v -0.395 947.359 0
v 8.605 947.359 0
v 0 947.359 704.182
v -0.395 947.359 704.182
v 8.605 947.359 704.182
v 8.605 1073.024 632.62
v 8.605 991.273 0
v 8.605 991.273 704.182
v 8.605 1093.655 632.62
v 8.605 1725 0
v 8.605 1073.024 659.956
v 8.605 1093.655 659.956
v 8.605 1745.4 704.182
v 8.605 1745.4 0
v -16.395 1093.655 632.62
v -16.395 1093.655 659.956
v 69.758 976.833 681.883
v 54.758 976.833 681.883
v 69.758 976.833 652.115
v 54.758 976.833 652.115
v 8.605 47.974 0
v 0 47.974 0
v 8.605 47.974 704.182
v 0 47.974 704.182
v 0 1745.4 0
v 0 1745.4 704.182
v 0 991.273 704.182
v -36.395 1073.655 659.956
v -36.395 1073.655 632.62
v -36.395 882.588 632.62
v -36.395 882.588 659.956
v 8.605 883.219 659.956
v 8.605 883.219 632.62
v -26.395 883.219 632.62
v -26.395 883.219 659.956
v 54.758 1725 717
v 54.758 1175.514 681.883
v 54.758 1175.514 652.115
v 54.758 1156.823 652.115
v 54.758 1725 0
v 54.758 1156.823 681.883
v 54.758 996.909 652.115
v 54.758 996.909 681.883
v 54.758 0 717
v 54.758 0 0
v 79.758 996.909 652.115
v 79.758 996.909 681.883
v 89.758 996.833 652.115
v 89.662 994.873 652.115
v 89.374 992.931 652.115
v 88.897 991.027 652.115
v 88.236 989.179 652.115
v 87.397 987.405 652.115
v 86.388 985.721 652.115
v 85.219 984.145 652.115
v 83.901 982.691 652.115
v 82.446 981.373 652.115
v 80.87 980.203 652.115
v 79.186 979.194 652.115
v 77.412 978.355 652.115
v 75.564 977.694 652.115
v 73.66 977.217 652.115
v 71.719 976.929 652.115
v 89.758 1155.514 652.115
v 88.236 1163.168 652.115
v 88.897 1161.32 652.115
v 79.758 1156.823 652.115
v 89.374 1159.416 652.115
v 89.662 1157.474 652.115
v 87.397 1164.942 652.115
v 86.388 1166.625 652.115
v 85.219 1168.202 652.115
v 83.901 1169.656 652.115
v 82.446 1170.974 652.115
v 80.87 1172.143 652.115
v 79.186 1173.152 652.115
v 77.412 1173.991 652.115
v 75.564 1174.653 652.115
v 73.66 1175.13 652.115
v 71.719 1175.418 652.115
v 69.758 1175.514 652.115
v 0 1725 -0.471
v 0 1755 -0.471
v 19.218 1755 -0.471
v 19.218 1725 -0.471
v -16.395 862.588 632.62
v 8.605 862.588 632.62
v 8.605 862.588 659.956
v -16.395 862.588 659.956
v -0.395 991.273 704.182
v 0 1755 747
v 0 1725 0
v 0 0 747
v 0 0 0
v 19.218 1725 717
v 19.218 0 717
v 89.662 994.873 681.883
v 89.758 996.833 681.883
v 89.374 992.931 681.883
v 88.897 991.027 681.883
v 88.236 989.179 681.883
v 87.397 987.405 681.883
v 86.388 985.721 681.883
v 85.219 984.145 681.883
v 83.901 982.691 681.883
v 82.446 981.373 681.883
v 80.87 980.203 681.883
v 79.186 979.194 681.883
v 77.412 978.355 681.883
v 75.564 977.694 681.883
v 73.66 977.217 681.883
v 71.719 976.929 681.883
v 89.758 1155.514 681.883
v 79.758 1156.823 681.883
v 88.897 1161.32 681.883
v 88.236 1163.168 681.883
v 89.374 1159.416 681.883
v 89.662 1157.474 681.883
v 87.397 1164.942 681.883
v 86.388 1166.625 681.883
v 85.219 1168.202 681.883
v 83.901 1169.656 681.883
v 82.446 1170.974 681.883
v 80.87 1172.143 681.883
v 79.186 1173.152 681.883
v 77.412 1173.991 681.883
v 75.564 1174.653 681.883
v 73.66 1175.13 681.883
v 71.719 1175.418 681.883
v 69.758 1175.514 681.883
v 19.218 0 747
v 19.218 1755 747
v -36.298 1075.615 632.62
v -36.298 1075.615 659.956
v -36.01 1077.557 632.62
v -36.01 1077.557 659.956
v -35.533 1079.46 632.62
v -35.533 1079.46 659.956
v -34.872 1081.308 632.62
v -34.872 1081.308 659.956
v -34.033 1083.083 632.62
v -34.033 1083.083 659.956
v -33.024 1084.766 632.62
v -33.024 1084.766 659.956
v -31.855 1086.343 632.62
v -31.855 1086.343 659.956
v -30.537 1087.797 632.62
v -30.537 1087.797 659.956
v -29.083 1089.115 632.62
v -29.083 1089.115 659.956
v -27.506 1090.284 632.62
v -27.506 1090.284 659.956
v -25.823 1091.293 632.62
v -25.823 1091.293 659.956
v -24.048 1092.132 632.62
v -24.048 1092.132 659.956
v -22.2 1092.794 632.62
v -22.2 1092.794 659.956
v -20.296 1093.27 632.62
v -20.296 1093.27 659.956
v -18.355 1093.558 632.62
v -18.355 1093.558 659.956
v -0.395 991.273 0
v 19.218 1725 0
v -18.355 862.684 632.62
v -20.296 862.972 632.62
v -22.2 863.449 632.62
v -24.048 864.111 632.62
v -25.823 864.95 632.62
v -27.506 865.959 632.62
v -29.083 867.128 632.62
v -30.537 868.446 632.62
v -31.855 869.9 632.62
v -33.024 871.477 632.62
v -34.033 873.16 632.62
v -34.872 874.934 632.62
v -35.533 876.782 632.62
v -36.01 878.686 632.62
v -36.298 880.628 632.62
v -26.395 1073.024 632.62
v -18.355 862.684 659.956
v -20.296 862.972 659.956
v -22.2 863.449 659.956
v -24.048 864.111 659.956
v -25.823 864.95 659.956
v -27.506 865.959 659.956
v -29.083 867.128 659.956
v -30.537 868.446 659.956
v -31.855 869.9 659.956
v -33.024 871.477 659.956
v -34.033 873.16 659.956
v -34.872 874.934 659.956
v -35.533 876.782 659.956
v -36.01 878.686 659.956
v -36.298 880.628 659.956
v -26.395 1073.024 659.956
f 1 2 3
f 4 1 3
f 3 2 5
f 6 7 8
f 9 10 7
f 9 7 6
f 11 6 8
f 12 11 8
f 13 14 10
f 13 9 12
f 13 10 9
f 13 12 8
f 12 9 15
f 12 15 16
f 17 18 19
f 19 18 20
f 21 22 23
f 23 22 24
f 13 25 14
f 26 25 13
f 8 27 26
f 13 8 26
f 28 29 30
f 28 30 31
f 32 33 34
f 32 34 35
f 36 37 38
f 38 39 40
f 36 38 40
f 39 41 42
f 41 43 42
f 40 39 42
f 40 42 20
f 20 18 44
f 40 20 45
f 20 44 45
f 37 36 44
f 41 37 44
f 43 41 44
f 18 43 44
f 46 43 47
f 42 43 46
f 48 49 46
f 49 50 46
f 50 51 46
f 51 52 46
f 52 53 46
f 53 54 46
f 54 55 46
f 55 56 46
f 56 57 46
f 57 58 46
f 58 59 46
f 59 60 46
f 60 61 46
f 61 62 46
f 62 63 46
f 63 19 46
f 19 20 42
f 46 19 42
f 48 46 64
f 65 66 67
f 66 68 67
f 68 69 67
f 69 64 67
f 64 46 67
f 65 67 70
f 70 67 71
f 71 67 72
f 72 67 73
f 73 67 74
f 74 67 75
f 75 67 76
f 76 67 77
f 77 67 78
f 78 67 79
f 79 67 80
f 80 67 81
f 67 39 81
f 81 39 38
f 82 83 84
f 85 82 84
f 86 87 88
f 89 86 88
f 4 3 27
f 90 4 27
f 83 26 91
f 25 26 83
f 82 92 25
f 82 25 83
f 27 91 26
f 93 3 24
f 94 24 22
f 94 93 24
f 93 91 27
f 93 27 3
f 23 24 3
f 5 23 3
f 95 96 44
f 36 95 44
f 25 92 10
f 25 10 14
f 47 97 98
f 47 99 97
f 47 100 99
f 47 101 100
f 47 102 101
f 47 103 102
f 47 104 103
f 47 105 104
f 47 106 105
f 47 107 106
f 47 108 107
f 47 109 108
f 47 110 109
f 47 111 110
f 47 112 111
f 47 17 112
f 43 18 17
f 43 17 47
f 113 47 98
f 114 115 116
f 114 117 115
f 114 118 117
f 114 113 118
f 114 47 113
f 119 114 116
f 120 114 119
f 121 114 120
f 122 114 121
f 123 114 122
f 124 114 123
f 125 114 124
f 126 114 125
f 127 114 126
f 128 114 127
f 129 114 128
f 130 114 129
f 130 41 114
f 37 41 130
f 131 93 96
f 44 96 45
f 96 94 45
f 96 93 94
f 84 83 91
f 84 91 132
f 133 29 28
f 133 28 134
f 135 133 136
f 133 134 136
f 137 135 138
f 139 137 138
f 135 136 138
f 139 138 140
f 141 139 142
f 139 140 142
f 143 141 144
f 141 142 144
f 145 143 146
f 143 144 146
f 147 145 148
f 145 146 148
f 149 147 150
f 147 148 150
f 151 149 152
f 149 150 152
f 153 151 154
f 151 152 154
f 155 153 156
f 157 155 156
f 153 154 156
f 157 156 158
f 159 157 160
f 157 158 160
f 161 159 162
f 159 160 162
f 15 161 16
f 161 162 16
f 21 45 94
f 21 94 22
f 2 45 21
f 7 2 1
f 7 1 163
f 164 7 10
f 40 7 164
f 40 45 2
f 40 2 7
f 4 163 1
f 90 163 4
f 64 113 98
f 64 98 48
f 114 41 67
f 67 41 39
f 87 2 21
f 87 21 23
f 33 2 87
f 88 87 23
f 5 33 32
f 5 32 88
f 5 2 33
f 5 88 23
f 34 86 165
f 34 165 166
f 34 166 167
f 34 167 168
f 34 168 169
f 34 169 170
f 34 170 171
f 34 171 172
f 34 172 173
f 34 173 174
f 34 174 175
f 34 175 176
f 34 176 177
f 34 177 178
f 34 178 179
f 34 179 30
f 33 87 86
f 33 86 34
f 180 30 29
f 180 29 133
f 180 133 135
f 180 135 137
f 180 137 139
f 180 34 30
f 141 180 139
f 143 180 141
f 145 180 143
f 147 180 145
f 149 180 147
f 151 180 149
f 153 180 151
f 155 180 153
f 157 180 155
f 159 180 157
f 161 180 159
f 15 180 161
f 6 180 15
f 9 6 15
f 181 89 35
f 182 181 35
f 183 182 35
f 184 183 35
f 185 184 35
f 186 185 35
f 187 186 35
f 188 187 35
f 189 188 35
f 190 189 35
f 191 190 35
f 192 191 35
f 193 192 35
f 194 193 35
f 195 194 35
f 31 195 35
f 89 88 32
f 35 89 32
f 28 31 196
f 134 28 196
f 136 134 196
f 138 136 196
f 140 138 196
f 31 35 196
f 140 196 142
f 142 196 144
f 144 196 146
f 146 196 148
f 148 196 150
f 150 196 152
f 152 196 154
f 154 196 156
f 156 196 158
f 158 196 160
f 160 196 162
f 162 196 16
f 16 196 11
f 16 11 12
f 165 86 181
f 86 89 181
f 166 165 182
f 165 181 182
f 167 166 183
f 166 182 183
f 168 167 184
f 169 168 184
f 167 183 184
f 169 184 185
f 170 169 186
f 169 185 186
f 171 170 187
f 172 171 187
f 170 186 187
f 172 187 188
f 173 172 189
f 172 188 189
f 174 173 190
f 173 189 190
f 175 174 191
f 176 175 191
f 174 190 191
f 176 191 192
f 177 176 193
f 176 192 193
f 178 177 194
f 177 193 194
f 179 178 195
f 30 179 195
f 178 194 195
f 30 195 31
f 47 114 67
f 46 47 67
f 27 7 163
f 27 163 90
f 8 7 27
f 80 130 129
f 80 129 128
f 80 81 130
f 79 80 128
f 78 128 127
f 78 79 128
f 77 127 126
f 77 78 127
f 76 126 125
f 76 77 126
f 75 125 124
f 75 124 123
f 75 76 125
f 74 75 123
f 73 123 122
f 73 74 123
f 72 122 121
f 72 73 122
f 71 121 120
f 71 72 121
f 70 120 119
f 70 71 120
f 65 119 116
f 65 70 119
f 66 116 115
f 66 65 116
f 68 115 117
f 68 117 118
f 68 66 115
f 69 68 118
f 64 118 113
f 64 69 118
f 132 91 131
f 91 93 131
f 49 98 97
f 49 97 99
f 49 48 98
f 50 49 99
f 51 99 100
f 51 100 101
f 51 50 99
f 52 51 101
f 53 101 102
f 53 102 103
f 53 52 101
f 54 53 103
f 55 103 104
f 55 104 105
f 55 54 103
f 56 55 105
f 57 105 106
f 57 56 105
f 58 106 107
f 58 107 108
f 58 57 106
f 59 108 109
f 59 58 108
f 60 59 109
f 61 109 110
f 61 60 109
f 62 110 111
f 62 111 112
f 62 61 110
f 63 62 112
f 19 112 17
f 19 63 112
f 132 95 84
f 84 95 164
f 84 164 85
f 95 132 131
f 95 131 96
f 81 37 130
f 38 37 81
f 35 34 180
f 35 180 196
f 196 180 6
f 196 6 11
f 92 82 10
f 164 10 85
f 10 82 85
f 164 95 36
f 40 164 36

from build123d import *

# Parameters (mm, degrees)
SKETCH1_W            = 54.758446478
SKETCH1_H            = 717
BOSS_EXTRUDE1_DEPTH  = 1725
SKETCH2_W            = 19.21757675
SKETCH2_H            = 1725
BOSS_EXTRUDE2_DEPTH  = 30
SKETCH3_W            = 19.21757675
SKETCH3_H            = 747.470855808
BOSS_EXTRUDE3_DEPTH  = 30
SKETCH5_W            = 704.182305872
SKETCH5_H            = 1697.425748722
CUT_EXTRUDE1_DEPTH   = 8.60534571
SKETCH6_W            = 704.182305872
SKETCH6_H            = 43.914333375
BOSS_EXTRUDE5_DEPTH  = 9
SKETCH7_W            = 29.914870165
SKETCH7_H            = 20.630944942
BOSS_EXTRUDE6_DEPTH  = 35
SKETCH8_W            = 29.914870164
SKETCH8_H            = 20.630944941
BOSS_EXTRUDE7_DEPTH  = 35
SKETCH9_W            = 27.336002047
SKETCH9_H            = 231.066583342
BOSS_EXTRUDE8_DEPTH  = 10
SKETCH10_W           = 2.578868118
SKETCH10_H           = 20.630944942
CUT_EXTRUDE2_DEPTH   = 35
SKETCH11_W           = 2.578868117
SKETCH11_H           = 20.630944941
CUT_EXTRUDE3_DEPTH   = 35
FILLET2_R            = 20
FILLET3_R            = 20
SKETCH12_W           = 29.76753668
SKETCH12_H           = 18.691243962
SKETCH12_H_2         = 20.075780552
BOSS_EXTRUDE9_DEPTH  = 25
SKETCH13_W           = 29.76753668
SKETCH13_H           = 198.681000631
BOSS_EXTRUDE10_DEPTH = 10
FILLET4_R            = 20
FILLET5_R            = 20


with BuildPart() as part:
    # Sketch1 → Boss-Extrude1 (new body)
    with BuildSketch(Plane(origin=(0, 0, 0), x_dir=(1, 0, 0), z_dir=(0, 1, 0))):
        with Locations((27.379223239, -358.5)):
            Rectangle(SKETCH1_W, SKETCH1_H)
    extrude(amount=BOSS_EXTRUDE1_DEPTH)

    # Sketch2 → Boss-Extrude2 (add)
    with BuildSketch(Plane.XY.offset(717)):
        with Locations((9.608788375, 862.5)):
            Rectangle(SKETCH2_W, SKETCH2_H)
    extrude(amount=BOSS_EXTRUDE2_DEPTH)

    # Sketch3 → Boss-Extrude3 (add)
    with BuildSketch(Plane(origin=(0, 1725, 0), x_dir=(1, 0, 0), z_dir=(0, 1, 0))):
        with Locations((9.608788375, -373.264572096)):
            Rectangle(SKETCH3_W, SKETCH3_H)
    extrude(amount=BOSS_EXTRUDE3_DEPTH)

    # Sketch5 → Cut-Extrude1 (cut)
    with BuildSketch(Plane.ZY):
        with Locations((352.091152936, 896.687125639)):
            Rectangle(SKETCH5_W, SKETCH5_H)
    extrude(amount=-CUT_EXTRUDE1_DEPTH, mode=Mode.SUBTRACT)

    # Sketch6 → Boss-Extrude5 (add)
    with BuildSketch(Plane.ZY.offset(-8.60534571)):
        with Locations((352.091152936, 969.31583271)):
            Rectangle(SKETCH6_W, SKETCH6_H)
    extrude(amount=BOSS_EXTRUDE5_DEPTH)

    # Sketch7 → Boss-Extrude6 (add)
    with BuildSketch(Plane.ZY.offset(-8.60534571)):
        with Locations((647.577834423, 1083.33925491)):
            Rectangle(SKETCH7_W, SKETCH7_H)
    extrude(amount=BOSS_EXTRUDE6_DEPTH)

    # Sketch8 → Boss-Extrude7 (add)
    with BuildSketch(Plane.ZY.offset(-8.60534571)):
        with Locations((644.998966305, 872.90361651)):
            Rectangle(SKETCH8_W, SKETCH8_H)
    extrude(amount=BOSS_EXTRUDE7_DEPTH)

    # Sketch9 → Boss-Extrude8 (add)
    with BuildSketch(Plane.ZY.offset(26.39465429)):
        with Locations((646.288400364, 978.12143571)):
            Rectangle(SKETCH9_W, SKETCH9_H)
    extrude(amount=BOSS_EXTRUDE8_DEPTH)

    # Sketch10 → Cut-Extrude2 (cut)
    with BuildSketch(Plane.ZY.offset(26.39465429)):
        with Locations((661.245835446, 1083.33925491)):
            Rectangle(SKETCH10_W, SKETCH10_H)
    extrude(amount=-CUT_EXTRUDE2_DEPTH, mode=Mode.SUBTRACT)

    # Sketch11 → Cut-Extrude3 (cut)
    with BuildSketch(Plane.ZY.offset(26.39465429)):
        with Locations((631.330965282, 872.90361651)):
            Rectangle(SKETCH11_W, SKETCH11_H)
    extrude(amount=-CUT_EXTRUDE3_DEPTH, mode=Mode.SUBTRACT)

    # Fillet2
    fillet2_edges = [part.edges().sort_by_distance(p)[0] for p in [
        (-36.39465429, 862.588144039, 646.288400364),
    ]]
    fillet(fillet2_edges, radius=FILLET2_R)

    # Fillet3
    fillet3_edges = [part.edges().sort_by_distance(p)[0] for p in [
        (-36.39465429, 1093.654727381, 646.288400364),
    ]]
    fillet(fillet3_edges, radius=FILLET3_R)

    # Sketch12 → Boss-Extrude9 (add)
    with BuildSketch(Plane(origin=(54.758446478, 0, 0), x_dir=(0, 0, -1), z_dir=(1, 0, 0))):
        with Locations((-666.999193263, 1166.168231526)):
            Rectangle(SKETCH12_W, SKETCH12_H)
        with Locations((-666.999193263, 986.870743152)):
            Rectangle(SKETCH12_W, SKETCH12_H_2)
    extrude(amount=BOSS_EXTRUDE9_DEPTH)

    # Sketch13 → Boss-Extrude10 (add)
    with BuildSketch(Plane(origin=(79.758446478, 0, 0), x_dir=(0, 0, -1), z_dir=(1, 0, 0))):
        with Locations((-666.999193263, 1076.173353192)):
            Rectangle(SKETCH13_W, SKETCH13_H)
    extrude(amount=BOSS_EXTRUDE10_DEPTH)

    # Fillet4
    fillet4_edges = [part.edges().sort_by_distance(p)[0] for p in [
        (89.758446478, 1175.513853507, 666.999193263),
    ]]
    fillet(fillet4_edges, radius=FILLET4_R)

    # Fillet5
    fillet5_edges = [part.edges().sort_by_distance(p)[0] for p in [
        (89.758446478, 976.832852876, 666.999193263),
    ]]
    fillet(fillet5_edges, radius=FILLET5_R)


solid = part.part
